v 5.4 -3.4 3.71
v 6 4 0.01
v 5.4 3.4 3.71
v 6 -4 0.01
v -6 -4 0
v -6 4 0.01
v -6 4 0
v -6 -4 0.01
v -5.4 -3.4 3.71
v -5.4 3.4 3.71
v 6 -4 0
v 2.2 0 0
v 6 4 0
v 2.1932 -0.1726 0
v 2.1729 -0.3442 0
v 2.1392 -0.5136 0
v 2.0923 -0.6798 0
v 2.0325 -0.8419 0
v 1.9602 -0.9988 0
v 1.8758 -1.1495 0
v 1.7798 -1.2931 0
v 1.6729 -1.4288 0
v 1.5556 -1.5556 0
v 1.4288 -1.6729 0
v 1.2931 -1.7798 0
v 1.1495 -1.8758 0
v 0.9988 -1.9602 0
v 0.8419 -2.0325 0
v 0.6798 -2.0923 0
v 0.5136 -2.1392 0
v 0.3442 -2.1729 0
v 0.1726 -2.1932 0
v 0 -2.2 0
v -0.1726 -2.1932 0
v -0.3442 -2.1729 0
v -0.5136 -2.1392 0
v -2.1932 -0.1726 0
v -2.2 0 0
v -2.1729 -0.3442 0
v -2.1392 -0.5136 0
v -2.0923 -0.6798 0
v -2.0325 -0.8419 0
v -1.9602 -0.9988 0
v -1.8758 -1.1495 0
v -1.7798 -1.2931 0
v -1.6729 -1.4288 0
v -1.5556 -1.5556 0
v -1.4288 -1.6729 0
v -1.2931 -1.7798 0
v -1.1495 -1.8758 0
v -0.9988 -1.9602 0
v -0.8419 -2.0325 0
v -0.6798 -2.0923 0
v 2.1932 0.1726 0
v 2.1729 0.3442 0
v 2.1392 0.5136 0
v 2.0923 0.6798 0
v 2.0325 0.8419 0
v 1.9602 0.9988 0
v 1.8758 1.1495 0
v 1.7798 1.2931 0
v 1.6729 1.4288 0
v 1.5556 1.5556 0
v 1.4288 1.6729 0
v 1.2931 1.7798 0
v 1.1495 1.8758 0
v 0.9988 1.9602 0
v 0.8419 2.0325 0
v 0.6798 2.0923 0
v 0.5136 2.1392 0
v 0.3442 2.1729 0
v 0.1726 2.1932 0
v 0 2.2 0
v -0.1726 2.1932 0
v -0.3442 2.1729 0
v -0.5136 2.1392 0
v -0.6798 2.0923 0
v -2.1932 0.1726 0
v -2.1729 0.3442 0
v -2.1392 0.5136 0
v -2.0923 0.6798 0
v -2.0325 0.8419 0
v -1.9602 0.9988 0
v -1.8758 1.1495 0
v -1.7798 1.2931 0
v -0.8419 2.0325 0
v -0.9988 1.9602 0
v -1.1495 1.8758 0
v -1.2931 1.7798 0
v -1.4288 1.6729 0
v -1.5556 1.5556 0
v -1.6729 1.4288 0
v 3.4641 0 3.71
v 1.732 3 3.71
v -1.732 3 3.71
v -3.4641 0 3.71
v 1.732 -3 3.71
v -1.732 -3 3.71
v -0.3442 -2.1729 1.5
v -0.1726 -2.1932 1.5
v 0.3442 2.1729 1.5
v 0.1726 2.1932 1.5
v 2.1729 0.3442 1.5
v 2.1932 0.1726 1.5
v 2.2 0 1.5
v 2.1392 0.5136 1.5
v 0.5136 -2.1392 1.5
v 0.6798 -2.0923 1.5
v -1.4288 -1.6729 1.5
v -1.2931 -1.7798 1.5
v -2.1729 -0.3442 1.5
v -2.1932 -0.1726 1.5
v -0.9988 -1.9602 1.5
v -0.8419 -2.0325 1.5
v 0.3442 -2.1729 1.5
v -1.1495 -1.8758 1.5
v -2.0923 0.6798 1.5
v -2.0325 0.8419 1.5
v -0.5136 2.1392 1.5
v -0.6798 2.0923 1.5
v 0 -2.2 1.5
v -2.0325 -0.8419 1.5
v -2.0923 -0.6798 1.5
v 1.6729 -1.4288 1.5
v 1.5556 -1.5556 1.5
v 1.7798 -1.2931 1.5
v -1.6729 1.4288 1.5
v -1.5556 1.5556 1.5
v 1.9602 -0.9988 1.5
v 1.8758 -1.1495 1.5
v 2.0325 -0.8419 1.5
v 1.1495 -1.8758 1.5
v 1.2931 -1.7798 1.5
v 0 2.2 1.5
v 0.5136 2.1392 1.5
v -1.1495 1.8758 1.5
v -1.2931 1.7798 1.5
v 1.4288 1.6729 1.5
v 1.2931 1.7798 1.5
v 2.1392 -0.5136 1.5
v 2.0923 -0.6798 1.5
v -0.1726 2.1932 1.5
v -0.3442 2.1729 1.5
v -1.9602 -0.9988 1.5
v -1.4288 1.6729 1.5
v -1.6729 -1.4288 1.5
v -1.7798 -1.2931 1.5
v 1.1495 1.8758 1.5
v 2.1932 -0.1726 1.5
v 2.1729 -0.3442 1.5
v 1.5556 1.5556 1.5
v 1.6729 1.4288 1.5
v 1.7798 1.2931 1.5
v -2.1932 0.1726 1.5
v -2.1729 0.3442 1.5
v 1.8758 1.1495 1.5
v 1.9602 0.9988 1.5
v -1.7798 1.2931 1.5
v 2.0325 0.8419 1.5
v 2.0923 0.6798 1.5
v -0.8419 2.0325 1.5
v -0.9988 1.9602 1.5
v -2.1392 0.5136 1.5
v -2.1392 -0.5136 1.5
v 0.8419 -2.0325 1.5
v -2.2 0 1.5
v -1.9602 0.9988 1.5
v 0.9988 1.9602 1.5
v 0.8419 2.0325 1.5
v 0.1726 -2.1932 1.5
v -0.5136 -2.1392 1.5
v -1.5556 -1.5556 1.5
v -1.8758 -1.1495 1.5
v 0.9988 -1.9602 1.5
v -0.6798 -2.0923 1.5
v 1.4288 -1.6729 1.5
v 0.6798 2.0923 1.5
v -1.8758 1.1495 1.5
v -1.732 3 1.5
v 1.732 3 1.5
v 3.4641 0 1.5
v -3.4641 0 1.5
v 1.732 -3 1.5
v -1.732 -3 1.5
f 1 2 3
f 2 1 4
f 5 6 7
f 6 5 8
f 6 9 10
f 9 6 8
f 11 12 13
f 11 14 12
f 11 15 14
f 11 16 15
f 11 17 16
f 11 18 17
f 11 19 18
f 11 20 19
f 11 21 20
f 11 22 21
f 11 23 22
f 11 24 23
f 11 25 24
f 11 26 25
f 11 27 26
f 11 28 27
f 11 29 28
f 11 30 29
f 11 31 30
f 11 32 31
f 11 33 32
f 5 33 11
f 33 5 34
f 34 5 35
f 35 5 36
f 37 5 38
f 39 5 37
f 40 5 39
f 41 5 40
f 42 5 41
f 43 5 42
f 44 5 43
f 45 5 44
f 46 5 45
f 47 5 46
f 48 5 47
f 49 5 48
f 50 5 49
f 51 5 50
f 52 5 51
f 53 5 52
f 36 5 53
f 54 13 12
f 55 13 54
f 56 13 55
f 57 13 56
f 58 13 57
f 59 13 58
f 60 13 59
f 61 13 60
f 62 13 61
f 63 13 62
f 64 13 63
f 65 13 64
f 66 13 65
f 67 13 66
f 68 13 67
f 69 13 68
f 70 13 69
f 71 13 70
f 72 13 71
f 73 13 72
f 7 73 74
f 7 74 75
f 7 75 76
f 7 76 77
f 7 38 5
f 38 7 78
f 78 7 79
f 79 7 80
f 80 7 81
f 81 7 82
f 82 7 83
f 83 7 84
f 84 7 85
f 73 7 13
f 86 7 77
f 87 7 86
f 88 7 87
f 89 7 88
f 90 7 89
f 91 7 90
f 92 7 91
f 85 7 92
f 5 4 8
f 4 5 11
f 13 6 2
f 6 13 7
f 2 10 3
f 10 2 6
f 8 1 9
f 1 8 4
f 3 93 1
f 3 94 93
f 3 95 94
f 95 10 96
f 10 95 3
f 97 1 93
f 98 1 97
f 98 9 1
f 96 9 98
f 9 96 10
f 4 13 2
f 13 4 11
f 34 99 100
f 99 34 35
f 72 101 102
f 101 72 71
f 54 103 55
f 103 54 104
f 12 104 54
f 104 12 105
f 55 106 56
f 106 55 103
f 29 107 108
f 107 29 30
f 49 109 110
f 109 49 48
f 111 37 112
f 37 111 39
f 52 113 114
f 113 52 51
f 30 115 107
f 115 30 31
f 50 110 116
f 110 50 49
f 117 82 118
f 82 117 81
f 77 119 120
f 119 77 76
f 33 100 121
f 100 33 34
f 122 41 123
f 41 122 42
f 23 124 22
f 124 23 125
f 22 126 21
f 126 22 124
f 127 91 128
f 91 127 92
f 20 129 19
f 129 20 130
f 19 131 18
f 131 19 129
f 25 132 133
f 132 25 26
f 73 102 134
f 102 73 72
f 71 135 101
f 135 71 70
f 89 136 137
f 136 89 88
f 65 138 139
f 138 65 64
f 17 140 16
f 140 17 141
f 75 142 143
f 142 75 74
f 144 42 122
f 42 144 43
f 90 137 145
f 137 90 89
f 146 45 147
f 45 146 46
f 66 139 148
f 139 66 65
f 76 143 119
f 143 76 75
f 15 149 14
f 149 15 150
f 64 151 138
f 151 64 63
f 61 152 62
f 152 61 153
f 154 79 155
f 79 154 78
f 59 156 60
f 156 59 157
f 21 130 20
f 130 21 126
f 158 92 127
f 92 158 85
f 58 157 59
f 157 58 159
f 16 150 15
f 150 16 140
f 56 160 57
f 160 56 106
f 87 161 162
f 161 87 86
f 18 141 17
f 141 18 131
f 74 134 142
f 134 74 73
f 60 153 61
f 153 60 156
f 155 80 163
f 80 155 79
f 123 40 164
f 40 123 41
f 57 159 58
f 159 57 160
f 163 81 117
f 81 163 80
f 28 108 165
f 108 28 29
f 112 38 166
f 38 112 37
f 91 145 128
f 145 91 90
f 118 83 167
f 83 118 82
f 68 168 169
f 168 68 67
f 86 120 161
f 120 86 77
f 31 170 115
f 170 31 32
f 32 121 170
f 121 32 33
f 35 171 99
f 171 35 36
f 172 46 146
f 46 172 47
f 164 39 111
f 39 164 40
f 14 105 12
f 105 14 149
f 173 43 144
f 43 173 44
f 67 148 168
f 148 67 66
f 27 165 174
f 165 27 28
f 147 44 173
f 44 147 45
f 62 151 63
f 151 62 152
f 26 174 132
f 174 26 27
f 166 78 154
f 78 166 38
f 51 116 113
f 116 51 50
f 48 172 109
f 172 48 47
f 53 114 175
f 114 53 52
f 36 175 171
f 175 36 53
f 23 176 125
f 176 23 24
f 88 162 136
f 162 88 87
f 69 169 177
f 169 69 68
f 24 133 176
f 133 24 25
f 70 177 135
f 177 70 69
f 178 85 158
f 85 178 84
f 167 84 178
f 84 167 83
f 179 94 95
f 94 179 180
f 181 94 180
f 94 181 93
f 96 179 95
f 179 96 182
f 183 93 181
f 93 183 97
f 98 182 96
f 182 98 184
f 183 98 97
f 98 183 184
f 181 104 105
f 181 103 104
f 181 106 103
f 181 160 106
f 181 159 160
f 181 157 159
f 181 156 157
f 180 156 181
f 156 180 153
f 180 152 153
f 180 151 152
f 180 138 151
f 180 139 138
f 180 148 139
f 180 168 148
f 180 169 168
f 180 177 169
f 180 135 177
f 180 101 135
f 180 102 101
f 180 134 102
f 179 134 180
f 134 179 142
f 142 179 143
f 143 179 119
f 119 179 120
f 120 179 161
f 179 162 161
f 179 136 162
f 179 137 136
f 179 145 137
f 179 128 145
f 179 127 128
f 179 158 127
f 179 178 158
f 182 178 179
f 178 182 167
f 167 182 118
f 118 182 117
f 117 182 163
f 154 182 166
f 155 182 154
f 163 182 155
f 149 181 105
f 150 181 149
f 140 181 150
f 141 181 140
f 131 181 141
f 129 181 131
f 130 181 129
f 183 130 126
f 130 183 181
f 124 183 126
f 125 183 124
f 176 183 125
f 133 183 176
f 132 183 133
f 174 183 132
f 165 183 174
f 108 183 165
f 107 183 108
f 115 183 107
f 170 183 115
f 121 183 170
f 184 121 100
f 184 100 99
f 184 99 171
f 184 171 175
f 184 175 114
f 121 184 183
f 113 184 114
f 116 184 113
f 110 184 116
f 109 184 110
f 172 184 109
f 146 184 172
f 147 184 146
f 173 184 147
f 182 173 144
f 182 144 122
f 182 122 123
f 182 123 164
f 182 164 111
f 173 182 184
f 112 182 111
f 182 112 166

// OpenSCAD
$fn = 80;

// Parameters (mm)
screw_d = 4.0;          // screw diameter
clearance = 0.4;        // clearance for screw hole
hole_d = screw_d + clearance;

across_flats = 6.0;     // hex across flats
thickness = 3.7;        // nut thickness

// T-slot nut body (generic): rectangular with slight edge chamfers
body_len = 12.0;
body_w   = 8.0;
chamfer  = 0.6;

// Helper: 2D hex polygon by across-flats
module hex2d(af){
    r = af / sqrt(3); // circumradius for flat-to-flat = sqrt(3)*r
    polygon(points=[
        [ r, 0],
        [ r/2,  r*sqrt(3)/2],
        [-r/2,  r*sqrt(3)/2],
        [-r, 0],
        [-r/2, -r*sqrt(3)/2],
        [ r/2, -r*sqrt(3)/2]
    ]);
}

// Helper: chamfered box via hull of two offset rectangles
module chamfered_box(l,w,h,c){
    c = min(c, min(l,w)/4);
    hull(){
        translate([0,0,0]) linear_extrude(height=0.01) square([l,w], center=true);
        translate([0,0,h]) linear_extrude(height=0.01) square([l-2*c,w-2*c], center=true);
    }
}

difference(){
    // Body
    chamfered_box(body_len, body_w, thickness, chamfer);

    // Through hole for screw
    translate([0,0,-0.5])
        cylinder(d=hole_d, h=thickness+1.0);

    // Hex pocket on top (for 6mm AF nut capture), shallow
    pocket_depth = min(2.2, thickness-0.6);
    translate([0,0,thickness - pocket_depth])
        linear_extrude(height=pocket_depth+0.2)
            hex2d(across_flats);
}
